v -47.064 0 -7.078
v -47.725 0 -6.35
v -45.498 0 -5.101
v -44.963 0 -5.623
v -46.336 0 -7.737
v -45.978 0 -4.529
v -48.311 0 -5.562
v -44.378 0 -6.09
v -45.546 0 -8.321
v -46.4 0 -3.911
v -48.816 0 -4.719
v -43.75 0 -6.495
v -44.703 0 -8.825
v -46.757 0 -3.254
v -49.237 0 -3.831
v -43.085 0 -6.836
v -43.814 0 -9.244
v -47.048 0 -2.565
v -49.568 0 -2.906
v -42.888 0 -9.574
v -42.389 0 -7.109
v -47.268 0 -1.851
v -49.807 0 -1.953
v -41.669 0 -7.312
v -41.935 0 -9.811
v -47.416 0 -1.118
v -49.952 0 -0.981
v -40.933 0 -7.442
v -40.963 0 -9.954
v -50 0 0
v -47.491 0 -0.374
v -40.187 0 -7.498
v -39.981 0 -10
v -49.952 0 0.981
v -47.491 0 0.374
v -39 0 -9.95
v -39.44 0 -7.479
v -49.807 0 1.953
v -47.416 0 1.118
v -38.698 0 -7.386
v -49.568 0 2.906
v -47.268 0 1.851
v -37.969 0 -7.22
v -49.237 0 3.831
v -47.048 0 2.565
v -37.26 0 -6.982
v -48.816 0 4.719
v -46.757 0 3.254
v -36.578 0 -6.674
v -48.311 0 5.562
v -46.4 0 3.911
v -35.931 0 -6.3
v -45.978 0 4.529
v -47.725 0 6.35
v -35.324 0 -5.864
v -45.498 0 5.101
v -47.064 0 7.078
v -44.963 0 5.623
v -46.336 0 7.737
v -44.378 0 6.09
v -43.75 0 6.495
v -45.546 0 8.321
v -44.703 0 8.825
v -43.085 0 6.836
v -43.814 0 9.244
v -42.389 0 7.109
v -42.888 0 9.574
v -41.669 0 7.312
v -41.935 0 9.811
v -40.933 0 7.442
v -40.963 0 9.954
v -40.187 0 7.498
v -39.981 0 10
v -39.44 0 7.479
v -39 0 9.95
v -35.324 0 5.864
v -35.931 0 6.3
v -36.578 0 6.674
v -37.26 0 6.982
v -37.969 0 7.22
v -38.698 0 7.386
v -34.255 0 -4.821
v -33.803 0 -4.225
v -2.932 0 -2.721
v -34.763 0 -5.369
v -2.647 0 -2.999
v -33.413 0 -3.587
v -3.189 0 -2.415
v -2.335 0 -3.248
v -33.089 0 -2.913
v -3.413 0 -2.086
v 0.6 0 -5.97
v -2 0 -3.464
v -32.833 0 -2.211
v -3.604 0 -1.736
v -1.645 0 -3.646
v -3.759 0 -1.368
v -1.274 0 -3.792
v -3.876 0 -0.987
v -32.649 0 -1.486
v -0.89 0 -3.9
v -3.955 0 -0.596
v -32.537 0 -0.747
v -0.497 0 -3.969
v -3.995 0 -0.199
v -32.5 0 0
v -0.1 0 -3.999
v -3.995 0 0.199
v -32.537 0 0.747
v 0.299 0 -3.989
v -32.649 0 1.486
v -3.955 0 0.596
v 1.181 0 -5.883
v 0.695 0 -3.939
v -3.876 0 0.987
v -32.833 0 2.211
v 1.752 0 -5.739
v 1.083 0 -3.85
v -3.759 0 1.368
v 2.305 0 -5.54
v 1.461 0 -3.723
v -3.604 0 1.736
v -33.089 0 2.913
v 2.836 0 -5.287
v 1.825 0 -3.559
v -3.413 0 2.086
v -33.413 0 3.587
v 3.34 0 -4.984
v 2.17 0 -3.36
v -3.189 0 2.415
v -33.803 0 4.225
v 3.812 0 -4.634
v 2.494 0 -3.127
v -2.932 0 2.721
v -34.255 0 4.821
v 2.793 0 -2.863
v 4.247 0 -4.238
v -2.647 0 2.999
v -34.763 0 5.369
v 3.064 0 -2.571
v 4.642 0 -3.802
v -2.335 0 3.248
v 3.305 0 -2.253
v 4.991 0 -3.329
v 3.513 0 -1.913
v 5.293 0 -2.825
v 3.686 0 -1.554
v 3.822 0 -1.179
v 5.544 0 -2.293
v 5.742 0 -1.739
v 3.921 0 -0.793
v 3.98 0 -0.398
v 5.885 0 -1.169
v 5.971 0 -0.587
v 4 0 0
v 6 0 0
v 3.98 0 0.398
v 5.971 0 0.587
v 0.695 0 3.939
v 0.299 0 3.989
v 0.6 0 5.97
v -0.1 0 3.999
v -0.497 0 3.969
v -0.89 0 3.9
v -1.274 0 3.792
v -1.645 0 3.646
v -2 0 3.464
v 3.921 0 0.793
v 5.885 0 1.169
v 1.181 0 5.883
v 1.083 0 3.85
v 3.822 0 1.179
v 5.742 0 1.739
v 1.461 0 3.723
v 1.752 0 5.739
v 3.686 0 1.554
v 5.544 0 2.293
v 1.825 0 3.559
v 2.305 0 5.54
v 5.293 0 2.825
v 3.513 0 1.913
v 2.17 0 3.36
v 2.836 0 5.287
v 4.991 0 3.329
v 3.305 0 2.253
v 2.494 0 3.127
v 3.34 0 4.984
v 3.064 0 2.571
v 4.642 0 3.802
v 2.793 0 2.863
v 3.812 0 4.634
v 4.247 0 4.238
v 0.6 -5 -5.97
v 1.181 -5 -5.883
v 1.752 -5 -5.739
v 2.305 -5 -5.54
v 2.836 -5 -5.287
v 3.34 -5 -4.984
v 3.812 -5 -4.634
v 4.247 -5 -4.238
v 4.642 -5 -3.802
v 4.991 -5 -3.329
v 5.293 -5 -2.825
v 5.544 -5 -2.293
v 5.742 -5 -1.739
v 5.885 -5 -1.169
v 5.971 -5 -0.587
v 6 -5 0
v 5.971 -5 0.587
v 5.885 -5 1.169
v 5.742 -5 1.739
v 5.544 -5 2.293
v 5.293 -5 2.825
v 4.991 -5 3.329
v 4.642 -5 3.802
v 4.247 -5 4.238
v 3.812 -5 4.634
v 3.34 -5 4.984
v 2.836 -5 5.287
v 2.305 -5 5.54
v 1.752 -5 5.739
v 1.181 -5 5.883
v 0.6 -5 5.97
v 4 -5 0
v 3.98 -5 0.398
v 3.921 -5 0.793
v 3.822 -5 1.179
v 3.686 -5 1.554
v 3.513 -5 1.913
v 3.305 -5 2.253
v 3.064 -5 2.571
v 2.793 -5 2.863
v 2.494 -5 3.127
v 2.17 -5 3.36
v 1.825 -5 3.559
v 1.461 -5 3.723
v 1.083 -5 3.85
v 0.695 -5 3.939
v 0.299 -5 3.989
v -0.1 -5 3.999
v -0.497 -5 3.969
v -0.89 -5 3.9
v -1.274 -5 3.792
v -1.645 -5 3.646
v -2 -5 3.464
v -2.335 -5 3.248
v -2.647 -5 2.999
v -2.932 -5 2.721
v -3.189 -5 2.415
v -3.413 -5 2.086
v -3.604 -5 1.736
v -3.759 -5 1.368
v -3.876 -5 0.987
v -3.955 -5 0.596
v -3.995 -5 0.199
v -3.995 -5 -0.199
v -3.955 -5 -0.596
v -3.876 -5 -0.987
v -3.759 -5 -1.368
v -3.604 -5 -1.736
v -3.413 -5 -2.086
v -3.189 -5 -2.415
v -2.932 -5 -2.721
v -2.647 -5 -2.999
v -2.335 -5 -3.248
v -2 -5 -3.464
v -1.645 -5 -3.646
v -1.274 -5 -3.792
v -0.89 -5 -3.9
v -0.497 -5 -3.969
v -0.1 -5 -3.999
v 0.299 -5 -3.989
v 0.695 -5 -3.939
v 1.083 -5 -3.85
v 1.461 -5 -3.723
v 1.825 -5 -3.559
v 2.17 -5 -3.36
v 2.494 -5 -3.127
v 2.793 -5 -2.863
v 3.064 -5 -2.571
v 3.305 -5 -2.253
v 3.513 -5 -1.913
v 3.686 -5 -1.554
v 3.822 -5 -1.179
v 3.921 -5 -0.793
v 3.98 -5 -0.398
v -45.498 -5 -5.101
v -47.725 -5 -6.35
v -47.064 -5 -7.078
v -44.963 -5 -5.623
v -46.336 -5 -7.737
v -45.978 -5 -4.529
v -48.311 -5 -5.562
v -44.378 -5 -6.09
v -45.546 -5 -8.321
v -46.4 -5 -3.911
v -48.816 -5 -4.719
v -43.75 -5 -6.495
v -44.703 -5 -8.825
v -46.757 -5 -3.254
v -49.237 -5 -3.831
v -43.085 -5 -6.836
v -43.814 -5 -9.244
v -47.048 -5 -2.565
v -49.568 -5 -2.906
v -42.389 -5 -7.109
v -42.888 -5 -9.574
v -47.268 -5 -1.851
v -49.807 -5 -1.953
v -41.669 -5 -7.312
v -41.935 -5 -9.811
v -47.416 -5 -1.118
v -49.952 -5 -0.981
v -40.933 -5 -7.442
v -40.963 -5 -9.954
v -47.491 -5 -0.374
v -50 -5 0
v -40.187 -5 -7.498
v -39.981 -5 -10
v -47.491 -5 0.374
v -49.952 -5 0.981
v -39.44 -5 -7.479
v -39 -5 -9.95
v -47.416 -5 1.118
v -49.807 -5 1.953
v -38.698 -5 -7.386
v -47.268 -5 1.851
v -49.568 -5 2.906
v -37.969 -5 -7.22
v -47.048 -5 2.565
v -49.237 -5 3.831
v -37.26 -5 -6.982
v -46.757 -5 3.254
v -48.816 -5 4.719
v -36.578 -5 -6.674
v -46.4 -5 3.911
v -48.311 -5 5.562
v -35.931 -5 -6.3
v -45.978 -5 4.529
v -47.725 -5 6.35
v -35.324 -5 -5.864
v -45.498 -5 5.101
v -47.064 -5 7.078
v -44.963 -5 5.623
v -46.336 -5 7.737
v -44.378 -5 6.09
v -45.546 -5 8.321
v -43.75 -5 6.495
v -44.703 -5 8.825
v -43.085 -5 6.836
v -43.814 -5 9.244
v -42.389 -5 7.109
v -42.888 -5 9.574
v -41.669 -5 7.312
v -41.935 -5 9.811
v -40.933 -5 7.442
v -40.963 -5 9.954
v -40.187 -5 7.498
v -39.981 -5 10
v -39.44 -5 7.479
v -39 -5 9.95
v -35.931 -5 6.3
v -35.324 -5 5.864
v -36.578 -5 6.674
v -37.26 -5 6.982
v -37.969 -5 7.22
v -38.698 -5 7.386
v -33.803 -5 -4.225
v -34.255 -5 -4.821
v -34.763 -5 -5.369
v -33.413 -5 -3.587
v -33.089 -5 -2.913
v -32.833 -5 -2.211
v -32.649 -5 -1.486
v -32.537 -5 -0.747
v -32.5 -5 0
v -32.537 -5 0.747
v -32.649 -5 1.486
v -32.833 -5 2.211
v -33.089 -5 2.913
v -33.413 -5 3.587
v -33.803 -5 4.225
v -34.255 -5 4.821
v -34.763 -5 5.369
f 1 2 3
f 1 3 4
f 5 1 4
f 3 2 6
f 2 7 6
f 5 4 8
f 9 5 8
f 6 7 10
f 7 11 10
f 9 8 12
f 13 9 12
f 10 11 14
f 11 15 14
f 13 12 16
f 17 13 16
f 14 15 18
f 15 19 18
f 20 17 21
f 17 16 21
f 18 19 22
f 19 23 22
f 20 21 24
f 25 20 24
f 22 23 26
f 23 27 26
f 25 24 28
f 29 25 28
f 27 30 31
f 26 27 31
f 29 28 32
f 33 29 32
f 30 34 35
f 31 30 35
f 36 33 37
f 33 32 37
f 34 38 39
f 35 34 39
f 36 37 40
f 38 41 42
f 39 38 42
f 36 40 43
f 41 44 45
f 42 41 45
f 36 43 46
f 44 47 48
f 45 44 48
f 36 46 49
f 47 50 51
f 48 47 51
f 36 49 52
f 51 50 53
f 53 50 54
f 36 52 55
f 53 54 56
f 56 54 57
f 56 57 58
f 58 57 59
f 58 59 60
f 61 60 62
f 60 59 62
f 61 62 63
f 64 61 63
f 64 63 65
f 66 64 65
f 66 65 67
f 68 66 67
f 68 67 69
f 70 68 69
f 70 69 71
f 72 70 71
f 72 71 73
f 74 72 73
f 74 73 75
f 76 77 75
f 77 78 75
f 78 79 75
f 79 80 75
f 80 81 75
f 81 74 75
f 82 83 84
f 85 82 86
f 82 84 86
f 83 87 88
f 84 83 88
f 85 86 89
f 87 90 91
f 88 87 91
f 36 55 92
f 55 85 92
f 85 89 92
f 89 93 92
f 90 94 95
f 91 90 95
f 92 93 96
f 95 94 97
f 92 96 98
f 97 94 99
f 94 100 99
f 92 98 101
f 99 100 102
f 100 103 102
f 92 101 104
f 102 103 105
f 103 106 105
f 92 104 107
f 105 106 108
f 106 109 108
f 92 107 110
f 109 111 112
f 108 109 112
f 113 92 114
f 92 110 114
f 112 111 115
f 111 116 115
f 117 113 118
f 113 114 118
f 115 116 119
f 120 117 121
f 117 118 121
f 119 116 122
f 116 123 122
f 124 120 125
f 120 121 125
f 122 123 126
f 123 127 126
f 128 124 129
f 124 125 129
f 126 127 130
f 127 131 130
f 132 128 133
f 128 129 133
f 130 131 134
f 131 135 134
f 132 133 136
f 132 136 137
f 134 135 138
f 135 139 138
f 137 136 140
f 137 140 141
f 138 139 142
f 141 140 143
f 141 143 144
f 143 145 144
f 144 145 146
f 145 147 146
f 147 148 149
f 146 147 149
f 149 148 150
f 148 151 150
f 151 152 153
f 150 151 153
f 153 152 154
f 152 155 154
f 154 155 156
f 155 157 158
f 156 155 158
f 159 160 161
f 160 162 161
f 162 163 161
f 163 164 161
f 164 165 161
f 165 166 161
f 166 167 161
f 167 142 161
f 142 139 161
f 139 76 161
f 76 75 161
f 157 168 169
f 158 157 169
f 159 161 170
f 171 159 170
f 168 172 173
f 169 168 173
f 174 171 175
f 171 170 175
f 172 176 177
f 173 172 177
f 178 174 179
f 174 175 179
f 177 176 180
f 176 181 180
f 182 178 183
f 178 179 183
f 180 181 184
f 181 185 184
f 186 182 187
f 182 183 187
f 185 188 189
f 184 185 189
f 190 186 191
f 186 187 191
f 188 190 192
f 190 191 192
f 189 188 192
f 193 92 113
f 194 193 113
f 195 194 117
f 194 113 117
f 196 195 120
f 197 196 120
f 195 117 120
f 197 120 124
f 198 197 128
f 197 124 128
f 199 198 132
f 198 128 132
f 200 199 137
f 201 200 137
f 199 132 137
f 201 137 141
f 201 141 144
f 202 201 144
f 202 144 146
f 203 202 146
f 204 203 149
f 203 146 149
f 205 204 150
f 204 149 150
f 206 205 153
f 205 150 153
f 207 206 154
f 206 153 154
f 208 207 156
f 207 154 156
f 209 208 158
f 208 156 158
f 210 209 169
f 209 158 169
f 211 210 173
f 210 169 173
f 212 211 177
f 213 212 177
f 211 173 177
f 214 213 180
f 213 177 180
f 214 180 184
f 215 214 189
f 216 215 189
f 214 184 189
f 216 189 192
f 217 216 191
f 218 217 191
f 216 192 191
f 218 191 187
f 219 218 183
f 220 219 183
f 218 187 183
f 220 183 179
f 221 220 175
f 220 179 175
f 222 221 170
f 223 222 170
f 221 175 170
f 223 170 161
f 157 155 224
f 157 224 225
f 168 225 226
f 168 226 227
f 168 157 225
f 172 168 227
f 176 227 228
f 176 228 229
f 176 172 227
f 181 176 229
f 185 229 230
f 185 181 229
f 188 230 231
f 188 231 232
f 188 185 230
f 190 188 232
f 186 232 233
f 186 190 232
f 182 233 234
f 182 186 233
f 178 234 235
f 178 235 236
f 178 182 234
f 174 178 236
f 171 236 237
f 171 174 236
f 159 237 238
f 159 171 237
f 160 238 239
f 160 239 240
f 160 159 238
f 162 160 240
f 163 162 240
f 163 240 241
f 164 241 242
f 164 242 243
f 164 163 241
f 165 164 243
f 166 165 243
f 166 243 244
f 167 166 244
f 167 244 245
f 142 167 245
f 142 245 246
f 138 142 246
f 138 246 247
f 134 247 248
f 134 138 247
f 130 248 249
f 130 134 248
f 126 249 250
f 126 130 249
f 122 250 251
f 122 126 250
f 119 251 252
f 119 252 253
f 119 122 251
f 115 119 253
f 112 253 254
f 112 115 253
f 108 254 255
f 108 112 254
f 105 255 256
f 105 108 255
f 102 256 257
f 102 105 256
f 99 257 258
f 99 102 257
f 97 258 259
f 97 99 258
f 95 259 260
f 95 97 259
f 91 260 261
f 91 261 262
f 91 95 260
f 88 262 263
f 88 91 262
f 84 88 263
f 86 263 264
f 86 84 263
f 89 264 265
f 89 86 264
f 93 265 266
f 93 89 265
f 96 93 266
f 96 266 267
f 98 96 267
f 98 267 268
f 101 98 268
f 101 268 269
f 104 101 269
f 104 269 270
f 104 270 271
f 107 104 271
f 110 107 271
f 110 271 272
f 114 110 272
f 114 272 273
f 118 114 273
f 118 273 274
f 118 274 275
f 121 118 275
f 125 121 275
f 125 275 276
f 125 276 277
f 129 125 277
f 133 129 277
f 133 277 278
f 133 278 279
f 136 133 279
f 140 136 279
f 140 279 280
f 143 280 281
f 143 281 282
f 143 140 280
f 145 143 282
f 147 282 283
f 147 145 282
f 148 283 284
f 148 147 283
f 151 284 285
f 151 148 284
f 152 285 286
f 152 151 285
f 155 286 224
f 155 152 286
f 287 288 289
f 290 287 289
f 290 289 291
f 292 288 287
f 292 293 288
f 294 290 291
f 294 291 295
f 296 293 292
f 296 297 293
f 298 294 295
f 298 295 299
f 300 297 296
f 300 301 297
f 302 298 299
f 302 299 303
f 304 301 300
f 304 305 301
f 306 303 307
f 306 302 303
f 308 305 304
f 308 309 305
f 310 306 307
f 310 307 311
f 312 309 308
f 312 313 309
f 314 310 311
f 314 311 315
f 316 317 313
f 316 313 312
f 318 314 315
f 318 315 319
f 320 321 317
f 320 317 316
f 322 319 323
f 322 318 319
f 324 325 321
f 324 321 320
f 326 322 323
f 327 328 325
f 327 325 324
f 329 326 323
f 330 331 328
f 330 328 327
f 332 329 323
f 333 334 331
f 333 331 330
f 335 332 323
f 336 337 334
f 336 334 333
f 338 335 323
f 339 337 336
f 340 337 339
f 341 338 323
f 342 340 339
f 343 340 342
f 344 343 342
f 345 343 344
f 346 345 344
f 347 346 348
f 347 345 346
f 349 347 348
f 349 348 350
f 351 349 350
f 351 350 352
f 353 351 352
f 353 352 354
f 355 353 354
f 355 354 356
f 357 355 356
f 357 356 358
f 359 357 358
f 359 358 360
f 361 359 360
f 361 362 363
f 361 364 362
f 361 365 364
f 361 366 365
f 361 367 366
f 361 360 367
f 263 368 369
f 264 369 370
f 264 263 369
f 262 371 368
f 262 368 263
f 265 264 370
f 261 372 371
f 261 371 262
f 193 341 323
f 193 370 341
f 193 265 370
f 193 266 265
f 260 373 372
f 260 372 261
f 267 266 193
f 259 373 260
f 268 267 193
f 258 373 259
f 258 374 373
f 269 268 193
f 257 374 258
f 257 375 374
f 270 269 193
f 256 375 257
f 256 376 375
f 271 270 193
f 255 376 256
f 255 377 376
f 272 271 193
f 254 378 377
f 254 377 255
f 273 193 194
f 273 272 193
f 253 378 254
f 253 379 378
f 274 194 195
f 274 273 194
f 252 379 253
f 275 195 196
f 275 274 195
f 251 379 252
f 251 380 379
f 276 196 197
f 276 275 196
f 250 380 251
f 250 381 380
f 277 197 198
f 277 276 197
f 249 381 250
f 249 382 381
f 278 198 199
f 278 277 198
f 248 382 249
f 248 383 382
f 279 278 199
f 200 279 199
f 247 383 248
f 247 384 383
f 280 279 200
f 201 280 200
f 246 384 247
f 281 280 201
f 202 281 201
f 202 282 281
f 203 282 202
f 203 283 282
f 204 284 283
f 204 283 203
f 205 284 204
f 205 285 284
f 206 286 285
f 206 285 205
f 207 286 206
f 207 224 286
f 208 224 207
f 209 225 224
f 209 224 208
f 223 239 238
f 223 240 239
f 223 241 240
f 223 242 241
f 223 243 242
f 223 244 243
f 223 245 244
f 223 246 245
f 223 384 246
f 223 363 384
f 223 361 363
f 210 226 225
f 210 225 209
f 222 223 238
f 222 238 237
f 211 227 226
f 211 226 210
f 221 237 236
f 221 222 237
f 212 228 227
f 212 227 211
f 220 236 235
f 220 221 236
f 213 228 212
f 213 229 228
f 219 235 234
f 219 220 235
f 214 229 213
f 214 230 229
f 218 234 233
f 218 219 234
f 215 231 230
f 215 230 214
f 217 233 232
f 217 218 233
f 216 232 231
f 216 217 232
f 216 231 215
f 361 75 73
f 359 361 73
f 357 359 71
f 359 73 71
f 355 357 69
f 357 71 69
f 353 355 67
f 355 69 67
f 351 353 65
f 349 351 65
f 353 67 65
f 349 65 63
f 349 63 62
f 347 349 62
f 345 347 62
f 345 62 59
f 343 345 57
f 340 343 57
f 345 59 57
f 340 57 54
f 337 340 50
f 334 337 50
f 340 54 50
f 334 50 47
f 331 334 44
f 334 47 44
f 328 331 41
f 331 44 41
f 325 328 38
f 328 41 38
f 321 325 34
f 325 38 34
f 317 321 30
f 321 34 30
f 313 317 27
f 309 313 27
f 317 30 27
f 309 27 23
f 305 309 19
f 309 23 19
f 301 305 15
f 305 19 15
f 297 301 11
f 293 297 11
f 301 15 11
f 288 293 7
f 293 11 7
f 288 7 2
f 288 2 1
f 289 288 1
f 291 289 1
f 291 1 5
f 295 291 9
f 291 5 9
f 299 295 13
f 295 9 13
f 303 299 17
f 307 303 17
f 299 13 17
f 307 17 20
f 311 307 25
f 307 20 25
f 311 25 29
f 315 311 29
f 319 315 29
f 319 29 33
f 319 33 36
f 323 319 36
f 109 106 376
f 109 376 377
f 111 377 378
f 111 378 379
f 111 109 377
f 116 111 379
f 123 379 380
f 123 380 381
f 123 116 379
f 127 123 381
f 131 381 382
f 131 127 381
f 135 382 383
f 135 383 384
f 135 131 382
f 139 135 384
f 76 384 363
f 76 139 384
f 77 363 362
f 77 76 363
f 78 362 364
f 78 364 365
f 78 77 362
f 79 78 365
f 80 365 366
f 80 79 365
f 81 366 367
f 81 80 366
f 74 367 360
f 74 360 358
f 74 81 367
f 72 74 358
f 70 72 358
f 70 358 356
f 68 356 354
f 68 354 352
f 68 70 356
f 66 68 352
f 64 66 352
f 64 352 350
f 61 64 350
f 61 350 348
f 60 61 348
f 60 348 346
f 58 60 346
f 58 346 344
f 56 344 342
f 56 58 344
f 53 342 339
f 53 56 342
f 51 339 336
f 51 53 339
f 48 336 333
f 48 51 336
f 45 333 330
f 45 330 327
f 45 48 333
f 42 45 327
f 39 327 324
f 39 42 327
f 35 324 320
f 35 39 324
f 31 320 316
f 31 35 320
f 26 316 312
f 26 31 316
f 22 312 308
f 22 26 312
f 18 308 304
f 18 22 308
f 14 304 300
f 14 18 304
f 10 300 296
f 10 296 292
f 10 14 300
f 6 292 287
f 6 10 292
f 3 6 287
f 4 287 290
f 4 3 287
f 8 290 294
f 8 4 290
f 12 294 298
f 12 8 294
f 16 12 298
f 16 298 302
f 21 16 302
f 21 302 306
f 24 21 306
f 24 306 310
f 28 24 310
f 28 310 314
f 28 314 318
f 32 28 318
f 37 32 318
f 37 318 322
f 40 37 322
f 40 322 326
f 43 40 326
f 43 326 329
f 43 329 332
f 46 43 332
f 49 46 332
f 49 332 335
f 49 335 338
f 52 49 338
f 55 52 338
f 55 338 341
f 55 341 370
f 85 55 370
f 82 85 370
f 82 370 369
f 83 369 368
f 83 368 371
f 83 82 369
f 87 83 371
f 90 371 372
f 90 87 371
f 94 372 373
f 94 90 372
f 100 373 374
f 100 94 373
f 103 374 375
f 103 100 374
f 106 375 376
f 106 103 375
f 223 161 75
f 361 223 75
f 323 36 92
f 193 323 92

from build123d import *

# Parameters (mm, degrees)
F0_R     = 7.5
F0_R_2   = 4
F1_DEPTH = 5


with BuildPart() as f1:
    # F0 (on Front) → F1 (new body)
    with BuildSketch(Plane.XZ):
        with BuildLine():
            Line((-39, -9.949874), (0.6, -5.969925))
            ThreePointArc((0.6, -5.969925), (6, 0), (0.6, 5.969925))
            Line((0.6, 5.969925), (-39, 9.949874))
            ThreePointArc((-39, 9.949874), (-50, 0), (-39, -9.949874))
        make_face()
        with Locations((-40, 0)):
            Circle(F0_R, mode=Mode.SUBTRACT)
        Circle(F0_R_2, mode=Mode.SUBTRACT)
    extrude(amount=F1_DEPTH)


solid = f1.part
